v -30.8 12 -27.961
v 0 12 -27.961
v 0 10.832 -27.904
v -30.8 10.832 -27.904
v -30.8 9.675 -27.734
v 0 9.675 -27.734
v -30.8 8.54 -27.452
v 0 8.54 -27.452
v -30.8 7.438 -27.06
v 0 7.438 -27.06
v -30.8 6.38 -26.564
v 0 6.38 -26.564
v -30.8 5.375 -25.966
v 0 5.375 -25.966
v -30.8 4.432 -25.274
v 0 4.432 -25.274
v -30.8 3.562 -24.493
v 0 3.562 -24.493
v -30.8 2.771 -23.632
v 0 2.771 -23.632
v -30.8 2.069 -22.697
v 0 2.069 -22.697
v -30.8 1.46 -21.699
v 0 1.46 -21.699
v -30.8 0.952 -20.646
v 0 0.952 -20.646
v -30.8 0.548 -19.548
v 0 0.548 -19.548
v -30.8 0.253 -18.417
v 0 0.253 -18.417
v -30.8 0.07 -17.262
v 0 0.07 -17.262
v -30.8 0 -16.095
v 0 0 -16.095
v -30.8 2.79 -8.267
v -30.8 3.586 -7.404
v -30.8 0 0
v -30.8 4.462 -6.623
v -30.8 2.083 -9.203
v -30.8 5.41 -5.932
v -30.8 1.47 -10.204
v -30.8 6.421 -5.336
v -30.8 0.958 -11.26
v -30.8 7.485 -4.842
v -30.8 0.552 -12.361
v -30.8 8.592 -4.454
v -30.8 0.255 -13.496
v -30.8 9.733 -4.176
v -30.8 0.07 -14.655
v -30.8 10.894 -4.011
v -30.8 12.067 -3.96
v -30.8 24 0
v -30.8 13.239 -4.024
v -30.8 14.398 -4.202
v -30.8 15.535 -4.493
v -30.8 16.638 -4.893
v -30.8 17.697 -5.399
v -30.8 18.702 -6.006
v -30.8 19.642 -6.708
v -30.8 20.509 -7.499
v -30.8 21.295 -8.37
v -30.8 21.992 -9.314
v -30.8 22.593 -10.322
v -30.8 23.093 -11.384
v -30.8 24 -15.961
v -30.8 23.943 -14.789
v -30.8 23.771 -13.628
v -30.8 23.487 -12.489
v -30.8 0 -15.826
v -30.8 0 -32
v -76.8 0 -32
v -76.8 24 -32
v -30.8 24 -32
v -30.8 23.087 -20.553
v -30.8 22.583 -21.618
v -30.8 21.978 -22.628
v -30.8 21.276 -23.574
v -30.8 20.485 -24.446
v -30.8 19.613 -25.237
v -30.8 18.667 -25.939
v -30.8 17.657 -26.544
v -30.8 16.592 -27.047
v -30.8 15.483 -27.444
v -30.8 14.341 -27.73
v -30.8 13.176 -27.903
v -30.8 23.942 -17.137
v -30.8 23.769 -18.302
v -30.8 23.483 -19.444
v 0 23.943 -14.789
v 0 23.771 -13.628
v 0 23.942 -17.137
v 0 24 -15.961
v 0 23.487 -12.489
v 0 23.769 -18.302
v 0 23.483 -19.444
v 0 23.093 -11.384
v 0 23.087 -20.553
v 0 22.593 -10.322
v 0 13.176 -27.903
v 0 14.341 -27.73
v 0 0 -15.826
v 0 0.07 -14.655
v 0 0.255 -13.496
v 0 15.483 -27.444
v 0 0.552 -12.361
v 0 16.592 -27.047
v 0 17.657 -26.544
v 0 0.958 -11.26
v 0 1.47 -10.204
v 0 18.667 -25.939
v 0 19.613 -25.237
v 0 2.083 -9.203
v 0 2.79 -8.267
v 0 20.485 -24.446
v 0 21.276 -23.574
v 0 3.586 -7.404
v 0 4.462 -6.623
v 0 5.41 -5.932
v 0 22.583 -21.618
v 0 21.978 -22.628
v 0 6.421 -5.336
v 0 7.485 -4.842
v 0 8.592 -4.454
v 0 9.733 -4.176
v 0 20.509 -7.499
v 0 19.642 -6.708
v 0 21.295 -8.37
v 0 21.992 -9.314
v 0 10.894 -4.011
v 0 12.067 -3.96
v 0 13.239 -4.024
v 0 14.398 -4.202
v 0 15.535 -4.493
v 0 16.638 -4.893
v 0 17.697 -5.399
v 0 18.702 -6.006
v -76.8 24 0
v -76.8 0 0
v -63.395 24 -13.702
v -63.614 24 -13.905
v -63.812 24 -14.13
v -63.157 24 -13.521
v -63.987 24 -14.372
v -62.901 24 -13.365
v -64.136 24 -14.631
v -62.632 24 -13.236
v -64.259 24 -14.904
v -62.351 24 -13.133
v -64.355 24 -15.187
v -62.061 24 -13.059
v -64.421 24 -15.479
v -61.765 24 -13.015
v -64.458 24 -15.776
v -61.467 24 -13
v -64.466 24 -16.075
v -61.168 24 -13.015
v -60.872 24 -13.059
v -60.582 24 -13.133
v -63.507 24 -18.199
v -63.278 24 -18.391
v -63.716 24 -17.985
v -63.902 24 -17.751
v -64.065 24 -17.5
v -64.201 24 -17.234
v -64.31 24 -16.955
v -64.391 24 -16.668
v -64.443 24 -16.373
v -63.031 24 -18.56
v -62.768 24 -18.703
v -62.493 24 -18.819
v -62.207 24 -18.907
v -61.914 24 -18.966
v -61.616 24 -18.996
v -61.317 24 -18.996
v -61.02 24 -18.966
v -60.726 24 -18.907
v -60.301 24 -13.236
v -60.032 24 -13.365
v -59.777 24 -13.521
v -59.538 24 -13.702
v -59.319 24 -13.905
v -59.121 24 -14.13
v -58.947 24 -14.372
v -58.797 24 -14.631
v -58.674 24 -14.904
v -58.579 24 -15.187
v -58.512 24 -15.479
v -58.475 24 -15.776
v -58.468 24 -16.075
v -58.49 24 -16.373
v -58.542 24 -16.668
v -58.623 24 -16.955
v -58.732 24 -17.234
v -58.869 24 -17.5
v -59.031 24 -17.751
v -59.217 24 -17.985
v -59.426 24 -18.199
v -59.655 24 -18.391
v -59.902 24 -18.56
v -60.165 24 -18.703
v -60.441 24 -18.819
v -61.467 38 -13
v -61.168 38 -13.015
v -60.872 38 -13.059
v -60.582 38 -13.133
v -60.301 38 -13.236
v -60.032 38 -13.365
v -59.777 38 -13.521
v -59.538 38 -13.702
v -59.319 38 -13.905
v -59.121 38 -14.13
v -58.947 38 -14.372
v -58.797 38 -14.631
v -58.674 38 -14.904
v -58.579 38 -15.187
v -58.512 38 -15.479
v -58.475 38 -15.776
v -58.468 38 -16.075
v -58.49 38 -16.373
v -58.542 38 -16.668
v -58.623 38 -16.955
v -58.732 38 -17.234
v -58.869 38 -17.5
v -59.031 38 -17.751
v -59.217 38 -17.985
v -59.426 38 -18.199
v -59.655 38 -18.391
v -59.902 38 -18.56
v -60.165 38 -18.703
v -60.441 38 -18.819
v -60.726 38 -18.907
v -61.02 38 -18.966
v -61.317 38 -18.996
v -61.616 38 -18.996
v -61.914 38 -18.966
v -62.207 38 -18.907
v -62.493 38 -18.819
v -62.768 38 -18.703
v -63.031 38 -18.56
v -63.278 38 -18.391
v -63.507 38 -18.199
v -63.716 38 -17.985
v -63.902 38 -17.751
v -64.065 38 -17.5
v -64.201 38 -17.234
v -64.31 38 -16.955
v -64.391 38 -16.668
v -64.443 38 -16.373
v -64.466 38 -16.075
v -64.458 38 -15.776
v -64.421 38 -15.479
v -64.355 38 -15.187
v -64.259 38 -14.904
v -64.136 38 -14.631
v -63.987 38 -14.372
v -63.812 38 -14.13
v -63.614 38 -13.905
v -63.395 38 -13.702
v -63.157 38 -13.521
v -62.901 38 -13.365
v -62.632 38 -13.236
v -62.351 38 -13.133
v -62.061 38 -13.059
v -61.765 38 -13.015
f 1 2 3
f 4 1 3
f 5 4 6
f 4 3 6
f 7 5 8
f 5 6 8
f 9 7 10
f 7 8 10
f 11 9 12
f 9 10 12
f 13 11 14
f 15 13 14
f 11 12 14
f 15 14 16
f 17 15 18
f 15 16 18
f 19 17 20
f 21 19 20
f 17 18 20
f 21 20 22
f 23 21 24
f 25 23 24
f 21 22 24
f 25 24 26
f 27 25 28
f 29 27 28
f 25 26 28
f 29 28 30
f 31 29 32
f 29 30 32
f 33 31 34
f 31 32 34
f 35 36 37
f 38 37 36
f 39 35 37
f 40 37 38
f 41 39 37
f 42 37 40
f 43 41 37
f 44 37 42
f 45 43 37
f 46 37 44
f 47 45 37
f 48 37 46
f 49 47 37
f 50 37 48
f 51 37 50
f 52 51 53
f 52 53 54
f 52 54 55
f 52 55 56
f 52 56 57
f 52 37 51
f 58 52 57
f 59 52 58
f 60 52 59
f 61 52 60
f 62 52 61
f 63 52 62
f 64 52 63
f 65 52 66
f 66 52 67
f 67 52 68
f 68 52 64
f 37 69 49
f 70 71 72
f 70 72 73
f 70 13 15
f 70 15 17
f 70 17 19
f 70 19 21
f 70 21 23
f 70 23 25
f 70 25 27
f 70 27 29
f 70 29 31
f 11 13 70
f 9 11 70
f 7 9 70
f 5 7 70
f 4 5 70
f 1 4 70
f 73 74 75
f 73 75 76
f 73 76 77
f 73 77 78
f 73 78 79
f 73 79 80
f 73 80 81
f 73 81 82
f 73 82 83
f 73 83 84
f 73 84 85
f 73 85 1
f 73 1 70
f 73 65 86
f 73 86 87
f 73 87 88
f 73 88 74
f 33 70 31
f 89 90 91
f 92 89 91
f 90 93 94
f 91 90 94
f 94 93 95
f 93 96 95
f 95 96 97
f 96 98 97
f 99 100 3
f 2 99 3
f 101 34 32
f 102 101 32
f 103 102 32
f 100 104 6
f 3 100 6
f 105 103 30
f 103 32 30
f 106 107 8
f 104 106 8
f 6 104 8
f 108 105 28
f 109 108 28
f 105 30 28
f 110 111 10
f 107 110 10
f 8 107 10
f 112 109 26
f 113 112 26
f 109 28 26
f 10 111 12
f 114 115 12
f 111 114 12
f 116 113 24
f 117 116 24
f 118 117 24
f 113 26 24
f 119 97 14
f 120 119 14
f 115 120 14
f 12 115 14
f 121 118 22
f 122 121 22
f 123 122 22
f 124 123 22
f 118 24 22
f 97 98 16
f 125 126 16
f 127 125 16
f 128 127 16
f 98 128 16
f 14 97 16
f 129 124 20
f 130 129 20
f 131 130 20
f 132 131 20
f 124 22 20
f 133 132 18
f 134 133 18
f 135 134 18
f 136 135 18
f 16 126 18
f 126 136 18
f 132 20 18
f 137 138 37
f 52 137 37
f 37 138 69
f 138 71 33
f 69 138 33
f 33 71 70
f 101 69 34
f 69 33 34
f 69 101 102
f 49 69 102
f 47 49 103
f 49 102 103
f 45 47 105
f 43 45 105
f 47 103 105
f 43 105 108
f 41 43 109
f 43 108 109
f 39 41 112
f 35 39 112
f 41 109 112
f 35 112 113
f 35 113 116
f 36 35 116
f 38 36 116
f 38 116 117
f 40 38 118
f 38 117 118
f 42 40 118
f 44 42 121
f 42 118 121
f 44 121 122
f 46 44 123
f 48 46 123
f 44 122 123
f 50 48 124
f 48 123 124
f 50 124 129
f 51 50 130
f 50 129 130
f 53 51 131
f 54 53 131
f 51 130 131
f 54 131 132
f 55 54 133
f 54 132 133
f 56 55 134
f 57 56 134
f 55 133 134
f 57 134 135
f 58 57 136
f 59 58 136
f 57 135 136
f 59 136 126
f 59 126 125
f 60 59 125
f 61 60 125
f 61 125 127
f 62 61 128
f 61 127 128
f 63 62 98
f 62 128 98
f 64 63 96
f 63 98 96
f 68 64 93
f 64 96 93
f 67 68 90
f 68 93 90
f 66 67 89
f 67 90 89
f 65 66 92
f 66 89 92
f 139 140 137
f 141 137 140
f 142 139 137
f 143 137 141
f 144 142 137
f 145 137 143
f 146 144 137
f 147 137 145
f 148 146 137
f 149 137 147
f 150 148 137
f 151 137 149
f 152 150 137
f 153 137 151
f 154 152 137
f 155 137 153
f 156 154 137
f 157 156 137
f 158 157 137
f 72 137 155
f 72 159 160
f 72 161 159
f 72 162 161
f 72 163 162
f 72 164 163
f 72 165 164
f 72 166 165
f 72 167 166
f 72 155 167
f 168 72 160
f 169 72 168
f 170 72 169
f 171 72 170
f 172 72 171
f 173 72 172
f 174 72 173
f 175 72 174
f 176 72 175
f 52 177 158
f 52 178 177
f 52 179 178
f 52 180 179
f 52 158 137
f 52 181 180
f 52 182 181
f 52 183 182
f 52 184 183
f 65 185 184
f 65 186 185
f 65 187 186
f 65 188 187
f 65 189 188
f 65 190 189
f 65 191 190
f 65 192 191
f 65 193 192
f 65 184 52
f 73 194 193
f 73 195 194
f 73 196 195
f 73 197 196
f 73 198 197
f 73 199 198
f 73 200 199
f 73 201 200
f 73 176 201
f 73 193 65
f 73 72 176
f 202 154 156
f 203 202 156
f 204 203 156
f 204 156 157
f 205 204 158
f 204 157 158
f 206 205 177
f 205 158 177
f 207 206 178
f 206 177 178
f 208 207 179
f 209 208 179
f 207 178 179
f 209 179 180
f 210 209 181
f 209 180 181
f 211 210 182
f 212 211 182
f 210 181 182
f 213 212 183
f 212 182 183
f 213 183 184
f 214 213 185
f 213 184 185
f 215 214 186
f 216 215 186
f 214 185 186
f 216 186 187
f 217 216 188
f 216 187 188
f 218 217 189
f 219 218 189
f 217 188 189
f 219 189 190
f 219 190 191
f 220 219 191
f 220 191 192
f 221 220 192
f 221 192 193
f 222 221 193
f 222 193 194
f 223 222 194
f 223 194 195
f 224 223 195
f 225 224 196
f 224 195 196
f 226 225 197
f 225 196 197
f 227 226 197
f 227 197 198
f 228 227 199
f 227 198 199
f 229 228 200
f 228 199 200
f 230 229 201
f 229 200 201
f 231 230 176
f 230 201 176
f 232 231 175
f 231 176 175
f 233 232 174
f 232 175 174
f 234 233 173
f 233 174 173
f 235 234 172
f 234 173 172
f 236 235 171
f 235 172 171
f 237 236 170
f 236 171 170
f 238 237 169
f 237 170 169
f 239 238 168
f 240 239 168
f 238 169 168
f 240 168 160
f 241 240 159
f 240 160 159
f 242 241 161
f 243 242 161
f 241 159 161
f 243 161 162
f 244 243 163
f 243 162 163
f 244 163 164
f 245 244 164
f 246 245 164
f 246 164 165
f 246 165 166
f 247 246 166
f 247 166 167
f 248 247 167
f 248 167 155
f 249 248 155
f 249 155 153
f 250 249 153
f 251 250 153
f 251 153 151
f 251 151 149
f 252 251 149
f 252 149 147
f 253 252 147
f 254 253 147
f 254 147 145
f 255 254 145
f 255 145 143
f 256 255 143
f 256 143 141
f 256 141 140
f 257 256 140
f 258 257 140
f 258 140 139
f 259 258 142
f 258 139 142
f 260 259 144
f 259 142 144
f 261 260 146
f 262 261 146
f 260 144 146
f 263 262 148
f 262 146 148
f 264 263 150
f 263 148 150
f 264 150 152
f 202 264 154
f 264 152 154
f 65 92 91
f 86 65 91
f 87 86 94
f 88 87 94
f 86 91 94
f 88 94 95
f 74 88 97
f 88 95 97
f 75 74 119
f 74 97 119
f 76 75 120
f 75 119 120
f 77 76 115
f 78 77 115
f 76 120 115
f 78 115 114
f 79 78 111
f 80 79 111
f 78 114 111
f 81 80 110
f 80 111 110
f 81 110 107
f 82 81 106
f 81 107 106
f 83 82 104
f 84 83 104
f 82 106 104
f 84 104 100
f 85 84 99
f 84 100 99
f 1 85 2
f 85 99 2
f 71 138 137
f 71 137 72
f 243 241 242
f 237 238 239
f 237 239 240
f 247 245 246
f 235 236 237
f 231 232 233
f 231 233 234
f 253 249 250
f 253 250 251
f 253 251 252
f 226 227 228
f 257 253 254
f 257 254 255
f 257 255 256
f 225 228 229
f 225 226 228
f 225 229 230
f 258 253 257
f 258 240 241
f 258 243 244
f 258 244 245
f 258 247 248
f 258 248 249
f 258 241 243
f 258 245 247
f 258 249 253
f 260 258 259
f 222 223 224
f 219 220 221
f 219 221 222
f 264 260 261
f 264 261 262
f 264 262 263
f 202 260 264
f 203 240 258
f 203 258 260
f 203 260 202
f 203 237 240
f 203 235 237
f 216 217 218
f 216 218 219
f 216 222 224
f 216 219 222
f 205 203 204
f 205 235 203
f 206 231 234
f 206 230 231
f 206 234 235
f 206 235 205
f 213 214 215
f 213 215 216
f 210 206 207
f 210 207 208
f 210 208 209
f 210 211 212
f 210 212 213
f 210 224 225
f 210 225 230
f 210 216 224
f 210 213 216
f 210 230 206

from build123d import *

# Parameters (mm, degrees)
SKETCH1_W           = 76.8
SKETCH1_H           = 32
BOSS_EXTRUDE1_DEPTH = 24
SKETCH2_R           = 3
BOSS_EXTRUDE2_DEPTH = 14
CUT_EXTRUDE1_DEPTH  = 30.8


with BuildPart() as part:
    # Sketch1 → Boss-Extrude1 (new body)
    with BuildSketch(Plane(origin=(0, 0, 0), x_dir=(1, 0, 0), z_dir=(0, 1, 0))):
        with Locations((-38.4, 16)):
            Rectangle(SKETCH1_W, SKETCH1_H)
    extrude(amount=BOSS_EXTRUDE1_DEPTH)

    # Sketch2 → Boss-Extrude2 (add)
    with BuildSketch(Plane(origin=(0, 24, 0), x_dir=(1, 0, 0), z_dir=(0, 1, 0))):
        with Locations(Location((-61.466666667, 16, 0), (0, 0, 270))):
            Circle(SKETCH2_R)
    extrude(amount=BOSS_EXTRUDE2_DEPTH)

    # Sketch3 → Cut-Extrude1 (cut)
    with BuildSketch(Plane(origin=(0, 0, 0), x_dir=(0, 0, -1), z_dir=(1, 0, 0))):
        with BuildLine():
            ThreePointArc((15.826247816, 0), (3.960387057, 12.066788737), (15.960575012, 24))
            Line((15.960575012, 24), (0, 24))
            Line((0, 24), (0, 0))
            Line((0, 0), (15.826247816, 0))
        make_face()
        with BuildLine():
            Line((32, 24), (15.960575012, 24))
            ThreePointArc((15.960575012, 24), (24.446122196, 20.485171272), (27.960950924, 11.999624088))
            ThreePointArc((27.960950924, 11.999624088), (24.493481869, 3.561702389), (16.094902207, 0))
            Line((16.094902207, 0), (32, 0))
            Line((32, 0), (32, 24))
        make_face()
    extrude(amount=-CUT_EXTRUDE1_DEPTH, mode=Mode.SUBTRACT)


solid = part.part
